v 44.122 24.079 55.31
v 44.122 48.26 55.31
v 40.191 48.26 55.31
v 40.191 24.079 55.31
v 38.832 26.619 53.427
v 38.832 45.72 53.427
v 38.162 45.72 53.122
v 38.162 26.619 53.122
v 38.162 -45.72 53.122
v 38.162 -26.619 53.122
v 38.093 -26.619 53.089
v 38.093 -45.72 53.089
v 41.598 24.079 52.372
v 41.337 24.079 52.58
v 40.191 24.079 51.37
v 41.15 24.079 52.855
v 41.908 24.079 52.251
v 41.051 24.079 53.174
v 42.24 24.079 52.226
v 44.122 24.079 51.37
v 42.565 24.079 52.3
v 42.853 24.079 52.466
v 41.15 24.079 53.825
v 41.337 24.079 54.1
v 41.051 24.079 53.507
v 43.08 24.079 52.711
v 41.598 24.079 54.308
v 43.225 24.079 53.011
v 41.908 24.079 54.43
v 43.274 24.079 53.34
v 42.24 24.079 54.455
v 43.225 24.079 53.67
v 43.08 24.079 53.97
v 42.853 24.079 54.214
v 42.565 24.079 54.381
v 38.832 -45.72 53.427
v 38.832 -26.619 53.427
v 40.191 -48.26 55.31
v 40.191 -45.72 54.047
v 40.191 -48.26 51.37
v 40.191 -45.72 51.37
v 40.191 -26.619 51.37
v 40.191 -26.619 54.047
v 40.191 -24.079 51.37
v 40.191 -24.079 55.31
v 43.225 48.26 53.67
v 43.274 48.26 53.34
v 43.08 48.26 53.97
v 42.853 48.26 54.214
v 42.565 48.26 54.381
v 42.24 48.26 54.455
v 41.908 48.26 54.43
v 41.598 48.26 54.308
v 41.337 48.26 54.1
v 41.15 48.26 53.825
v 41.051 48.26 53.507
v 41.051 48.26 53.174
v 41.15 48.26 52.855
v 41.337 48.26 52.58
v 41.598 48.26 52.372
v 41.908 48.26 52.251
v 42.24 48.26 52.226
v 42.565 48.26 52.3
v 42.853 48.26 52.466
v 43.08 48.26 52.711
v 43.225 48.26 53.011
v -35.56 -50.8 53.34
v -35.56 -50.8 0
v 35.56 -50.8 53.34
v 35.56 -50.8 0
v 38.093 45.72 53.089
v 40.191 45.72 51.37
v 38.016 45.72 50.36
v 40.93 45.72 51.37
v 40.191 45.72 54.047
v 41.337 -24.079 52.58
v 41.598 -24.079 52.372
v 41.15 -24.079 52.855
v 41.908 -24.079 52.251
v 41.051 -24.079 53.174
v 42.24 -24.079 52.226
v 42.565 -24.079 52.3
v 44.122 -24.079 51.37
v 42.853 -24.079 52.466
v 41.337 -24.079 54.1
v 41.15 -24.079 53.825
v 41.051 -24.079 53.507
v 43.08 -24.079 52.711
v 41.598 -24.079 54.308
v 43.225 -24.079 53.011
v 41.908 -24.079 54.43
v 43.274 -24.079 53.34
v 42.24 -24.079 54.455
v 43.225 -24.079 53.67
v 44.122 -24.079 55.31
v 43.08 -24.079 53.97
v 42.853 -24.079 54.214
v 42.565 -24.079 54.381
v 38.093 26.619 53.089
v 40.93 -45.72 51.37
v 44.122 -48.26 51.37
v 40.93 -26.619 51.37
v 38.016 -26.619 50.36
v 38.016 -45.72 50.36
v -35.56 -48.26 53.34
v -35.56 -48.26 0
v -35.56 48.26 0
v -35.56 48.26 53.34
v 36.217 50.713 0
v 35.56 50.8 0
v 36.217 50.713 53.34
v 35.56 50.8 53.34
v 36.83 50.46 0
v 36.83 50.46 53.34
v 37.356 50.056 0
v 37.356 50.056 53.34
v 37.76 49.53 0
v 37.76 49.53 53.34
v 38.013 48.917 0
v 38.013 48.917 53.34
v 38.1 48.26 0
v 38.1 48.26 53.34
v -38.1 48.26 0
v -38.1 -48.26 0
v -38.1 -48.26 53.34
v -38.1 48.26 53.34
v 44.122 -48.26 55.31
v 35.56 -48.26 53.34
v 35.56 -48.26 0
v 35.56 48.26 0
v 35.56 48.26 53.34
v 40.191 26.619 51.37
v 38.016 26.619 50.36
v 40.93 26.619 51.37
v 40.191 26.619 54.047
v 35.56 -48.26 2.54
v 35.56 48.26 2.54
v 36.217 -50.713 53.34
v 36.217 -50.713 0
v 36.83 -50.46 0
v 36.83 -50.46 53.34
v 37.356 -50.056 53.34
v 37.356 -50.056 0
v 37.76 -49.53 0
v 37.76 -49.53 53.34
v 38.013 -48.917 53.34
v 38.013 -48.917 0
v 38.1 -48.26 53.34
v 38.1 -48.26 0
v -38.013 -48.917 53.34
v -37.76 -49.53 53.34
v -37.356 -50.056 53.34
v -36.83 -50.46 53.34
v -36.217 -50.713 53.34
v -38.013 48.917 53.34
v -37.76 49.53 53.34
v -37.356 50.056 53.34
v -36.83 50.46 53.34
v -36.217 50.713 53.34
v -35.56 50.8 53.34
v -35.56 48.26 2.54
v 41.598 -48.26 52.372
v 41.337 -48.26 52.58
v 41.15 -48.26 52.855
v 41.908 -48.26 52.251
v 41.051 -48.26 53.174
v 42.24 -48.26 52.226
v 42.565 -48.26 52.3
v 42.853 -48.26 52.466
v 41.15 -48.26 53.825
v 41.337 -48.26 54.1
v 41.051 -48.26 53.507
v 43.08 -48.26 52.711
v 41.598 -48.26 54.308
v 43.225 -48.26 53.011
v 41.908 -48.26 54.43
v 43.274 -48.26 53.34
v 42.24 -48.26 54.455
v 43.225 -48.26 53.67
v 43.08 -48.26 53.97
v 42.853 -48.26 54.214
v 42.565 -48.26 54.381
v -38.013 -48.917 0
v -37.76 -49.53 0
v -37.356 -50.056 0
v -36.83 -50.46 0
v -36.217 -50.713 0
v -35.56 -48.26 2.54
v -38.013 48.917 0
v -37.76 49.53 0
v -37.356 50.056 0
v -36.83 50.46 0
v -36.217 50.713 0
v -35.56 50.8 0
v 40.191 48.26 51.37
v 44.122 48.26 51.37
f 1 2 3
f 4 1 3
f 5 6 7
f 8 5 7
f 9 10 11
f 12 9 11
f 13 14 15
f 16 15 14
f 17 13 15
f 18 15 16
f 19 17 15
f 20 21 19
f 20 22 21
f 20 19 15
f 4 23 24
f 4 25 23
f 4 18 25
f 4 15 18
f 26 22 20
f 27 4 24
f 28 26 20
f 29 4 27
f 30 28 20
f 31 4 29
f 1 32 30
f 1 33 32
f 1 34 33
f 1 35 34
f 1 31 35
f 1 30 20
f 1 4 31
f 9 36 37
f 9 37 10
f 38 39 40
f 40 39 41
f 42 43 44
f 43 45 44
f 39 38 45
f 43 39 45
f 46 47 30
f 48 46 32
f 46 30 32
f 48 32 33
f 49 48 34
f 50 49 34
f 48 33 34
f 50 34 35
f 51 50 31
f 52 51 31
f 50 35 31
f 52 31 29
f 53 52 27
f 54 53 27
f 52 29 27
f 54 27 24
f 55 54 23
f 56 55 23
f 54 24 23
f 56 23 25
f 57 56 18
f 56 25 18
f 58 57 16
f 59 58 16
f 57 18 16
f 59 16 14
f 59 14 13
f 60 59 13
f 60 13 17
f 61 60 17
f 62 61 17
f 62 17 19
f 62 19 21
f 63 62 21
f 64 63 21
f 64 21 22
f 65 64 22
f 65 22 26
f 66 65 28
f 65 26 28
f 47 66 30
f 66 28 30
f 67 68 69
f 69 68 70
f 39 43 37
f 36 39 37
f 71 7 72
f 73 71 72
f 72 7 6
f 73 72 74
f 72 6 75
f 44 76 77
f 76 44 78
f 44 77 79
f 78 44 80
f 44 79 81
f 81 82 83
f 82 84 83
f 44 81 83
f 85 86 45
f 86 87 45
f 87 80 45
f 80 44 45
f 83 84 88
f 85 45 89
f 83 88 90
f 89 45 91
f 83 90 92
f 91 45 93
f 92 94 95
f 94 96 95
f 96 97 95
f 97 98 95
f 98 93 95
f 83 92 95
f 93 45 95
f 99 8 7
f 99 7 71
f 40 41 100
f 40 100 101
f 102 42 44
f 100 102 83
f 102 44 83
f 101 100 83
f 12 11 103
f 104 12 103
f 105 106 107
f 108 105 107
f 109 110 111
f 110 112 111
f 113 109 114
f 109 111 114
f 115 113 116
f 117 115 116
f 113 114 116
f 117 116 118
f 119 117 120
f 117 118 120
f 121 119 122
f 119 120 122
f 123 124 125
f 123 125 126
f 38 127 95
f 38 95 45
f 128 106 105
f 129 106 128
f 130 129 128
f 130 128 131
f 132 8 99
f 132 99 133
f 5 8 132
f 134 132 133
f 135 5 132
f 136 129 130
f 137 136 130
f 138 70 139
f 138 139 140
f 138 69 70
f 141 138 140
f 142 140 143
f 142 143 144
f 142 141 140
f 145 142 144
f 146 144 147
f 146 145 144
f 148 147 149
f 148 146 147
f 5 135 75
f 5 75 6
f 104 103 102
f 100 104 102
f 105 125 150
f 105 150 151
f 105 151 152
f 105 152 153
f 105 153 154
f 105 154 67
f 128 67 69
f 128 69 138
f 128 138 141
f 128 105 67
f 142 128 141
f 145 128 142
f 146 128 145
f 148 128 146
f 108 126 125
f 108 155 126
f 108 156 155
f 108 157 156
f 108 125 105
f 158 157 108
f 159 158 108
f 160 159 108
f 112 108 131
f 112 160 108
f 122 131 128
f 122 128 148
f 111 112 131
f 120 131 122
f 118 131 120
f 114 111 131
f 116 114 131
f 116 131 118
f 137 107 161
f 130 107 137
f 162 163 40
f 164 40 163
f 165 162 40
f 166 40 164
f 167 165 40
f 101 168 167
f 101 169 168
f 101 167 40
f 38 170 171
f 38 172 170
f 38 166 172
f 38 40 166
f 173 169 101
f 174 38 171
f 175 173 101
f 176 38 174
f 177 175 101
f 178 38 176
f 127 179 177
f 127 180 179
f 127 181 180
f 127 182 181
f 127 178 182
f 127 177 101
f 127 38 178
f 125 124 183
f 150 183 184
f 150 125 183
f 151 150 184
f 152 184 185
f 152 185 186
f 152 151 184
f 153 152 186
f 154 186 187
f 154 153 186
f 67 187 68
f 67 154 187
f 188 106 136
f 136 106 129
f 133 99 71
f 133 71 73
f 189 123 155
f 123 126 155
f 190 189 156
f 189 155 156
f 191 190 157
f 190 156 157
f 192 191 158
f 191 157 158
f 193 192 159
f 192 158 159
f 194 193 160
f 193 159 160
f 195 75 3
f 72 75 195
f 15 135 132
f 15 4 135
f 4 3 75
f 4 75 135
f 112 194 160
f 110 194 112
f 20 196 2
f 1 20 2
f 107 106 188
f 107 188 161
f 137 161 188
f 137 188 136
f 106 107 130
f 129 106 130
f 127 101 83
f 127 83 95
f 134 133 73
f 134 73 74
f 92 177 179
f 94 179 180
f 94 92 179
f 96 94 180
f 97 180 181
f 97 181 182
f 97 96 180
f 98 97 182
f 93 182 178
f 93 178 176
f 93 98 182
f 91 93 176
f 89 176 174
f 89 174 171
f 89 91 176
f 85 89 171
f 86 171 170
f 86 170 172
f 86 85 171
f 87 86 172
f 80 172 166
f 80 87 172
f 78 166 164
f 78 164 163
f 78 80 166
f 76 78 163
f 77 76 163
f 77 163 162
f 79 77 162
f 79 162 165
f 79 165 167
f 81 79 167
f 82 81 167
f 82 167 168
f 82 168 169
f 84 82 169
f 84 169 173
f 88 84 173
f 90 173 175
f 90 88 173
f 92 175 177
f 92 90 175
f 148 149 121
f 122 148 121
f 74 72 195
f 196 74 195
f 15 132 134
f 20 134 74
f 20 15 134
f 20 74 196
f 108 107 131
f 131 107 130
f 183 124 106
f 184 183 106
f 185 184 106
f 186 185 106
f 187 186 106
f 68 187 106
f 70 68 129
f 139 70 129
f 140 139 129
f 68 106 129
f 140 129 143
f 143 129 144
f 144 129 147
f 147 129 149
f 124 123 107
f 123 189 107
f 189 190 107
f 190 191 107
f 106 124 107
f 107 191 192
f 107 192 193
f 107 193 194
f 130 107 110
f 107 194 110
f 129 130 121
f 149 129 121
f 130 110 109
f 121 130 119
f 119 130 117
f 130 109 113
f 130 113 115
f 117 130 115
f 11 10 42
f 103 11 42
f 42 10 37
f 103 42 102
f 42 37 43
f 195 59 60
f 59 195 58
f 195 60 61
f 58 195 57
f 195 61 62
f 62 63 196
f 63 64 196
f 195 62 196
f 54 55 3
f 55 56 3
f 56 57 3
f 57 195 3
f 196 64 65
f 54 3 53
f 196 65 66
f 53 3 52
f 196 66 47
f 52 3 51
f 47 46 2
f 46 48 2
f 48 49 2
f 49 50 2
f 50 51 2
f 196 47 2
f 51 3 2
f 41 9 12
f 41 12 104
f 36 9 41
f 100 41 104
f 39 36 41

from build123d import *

# Parameters (mm, degrees)
F0_W     = 76.2
F0_H     = 101.6
F0_W_2   = 71.12
F0_H_2   = 96.52
F1_DEPTH = 53.34
F2_DEPTH = 2.54
F3_R     = 2.54
F5_START = 24.0792
F4_R     = 1.1176
F5_DEPTH = 24.1808
F6_START = -24.0792
F6_DEPTH = 24.1808
F7_START = 26.6192
F7_DEPTH = 19.1008
F8_START = -26.6192
F8_DEPTH = 19.1008


with BuildPart() as f1:
    # F0 (on Top) → F1 (new body)
    with BuildSketch(Plane.XY):
        Rectangle(F0_W, F0_H)
        Rectangle(F0_W_2, F0_H_2, mode=Mode.SUBTRACT)
    extrude(amount=F1_DEPTH)

    # F3
    f3_edges = [f1.edges().sort_by_distance(p)[0] for p in [
        (38.1, 50.8, 26.67),
        (38.1, -50.8, 26.67),
        (-38.1, 50.8, 26.67),
        (-38.1, -50.8, 26.67),
    ]]
    fillet(f3_edges, radius=F3_R)


with BuildPart() as f2:
    # F0 (on Top) → F2 (new body)
    with BuildSketch(Plane.XY):
        Rectangle(F0_W_2, F0_H_2)
    extrude(amount=F2_DEPTH)


with BuildPart() as f5:
    # F4 (on Front) → F5 (new body)
    with BuildSketch(Plane.XZ.offset(F5_START)):
        with BuildLine():
            ThreePointArc((43.6170585206, 53.3402232693), (43.1892879745, 54.3729527232), (42.1565585206, 54.8007232693))
            ThreePointArc((42.1565585206, 54.8007232693), (41.813540729, 54.7598707764), (41.4897124367, 54.6395987156))
            ThreePointArc((41.4897124367, 54.6395987156), (40.7051061088, 53.5025382299), (41.2191582331, 52.2202496307))
            ThreePointArc((41.2191582331, 52.2202496307), (41.8726372288, 51.9075862077), (42.5959689009, 51.9473920635))
            ThreePointArc((42.5959689009, 51.9473920635), (43.3344420272, 52.4767125891), (43.6170585206, 53.3402232693))
        make_face()
        with Locations((42.1565585206, 53.3402232693)):
            Circle(F4_R, mode=Mode.SUBTRACT)
        with BuildLine():
            Line((44.122479856, 55.3104255827), (41.1208962703, 55.3104255827))
            Line((41.1208962703, 55.3104255827), (42.1565585206, 54.8007232693))
            ThreePointArc((42.1565585206, 54.8007232693), (43.1892879745, 54.3729527232), (43.6170585206, 53.3402232693))
            ThreePointArc((43.6170585206, 53.3402232693), (43.3344420272, 52.4767125891), (42.5959689009, 51.9473920635))
            Line((42.5959689009, 51.9473920635), (40.9301563026, 51.3700209558))
            Line((40.9301563026, 51.3700209558), (44.122479856, 51.3700209558))
            Line((44.122479856, 51.3700209558), (44.122479856, 55.3104255827))
        make_face()
        with BuildLine():
            Line((40.1906371851, 54.047077149), (40.1906371851, 52.7403943495))
            Line((40.1906371851, 52.7403943495), (41.2191582331, 52.2202496307))
            ThreePointArc((41.2191582331, 52.2202496307), (40.7051061088, 53.5025382299), (41.4897124367, 54.6395987156))
            Line((41.4897124367, 54.6395987156), (40.1906371851, 54.047077149))
        make_face()
        with BuildLine():
            Line((41.2191582331, 52.2202496307), (40.1906371851, 52.7403943495))
            Line((40.1906371851, 52.7403943495), (40.1906371851, 51.3700209558))
            Line((40.1906371851, 51.3700209558), (40.9301563026, 51.3700209558))
            Line((40.9301563026, 51.3700209558), (42.5959689009, 51.9473920635))
            ThreePointArc((42.5959689009, 51.9473920635), (41.8726372288, 51.9075862077), (41.2191582331, 52.2202496307))
        make_face()
        with BuildLine():
            Line((42.1565585206, 54.8007232693), (41.1208962703, 55.3104255827))
            Line((41.1208962703, 55.3104255827), (40.1906371851, 55.3104255827))
            Line((40.1906371851, 55.3104255827), (40.1906371851, 54.047077149))
            Line((40.1906371851, 54.047077149), (41.4897124367, 54.6395987156))
            ThreePointArc((41.4897124367, 54.6395987156), (41.813540729, 54.7598707764), (42.1565585206, 54.8007232693))
        make_face()
    extrude(amount=F5_DEPTH)

    # F4 (on Front) → F7 (join)
    with BuildSketch(Plane.XZ.offset(F7_START)):
        with BuildLine():
            Line((40.1906371851, 54.047077149), (40.1906371851, 52.7403943495))
            Line((40.1906371851, 52.7403943495), (41.2191582331, 52.2202496307))
            ThreePointArc((41.2191582331, 52.2202496307), (40.7051061088, 53.5025382299), (41.4897124367, 54.6395987156))
            Line((41.4897124367, 54.6395987156), (40.1906371851, 54.047077149))
        make_face()
        with BuildLine():
            Line((41.2191582331, 52.2202496307), (40.1906371851, 52.7403943495))
            Line((40.1906371851, 52.7403943495), (40.1906371851, 51.3700209558))
            Line((40.1906371851, 51.3700209558), (40.9301563026, 51.3700209558))
            Line((40.9301563026, 51.3700209558), (42.5959689009, 51.9473920635))
            ThreePointArc((42.5959689009, 51.9473920635), (41.8726372288, 51.9075862077), (41.2191582331, 52.2202496307))
        make_face()
        Polygon((38.1619204926, 53.1217586263), (38.0929333965, 53.0893978387), (38.0158303237, 50.3599147648), (40.9301563026, 51.3700209558), (40.1906371851, 51.3700209558), (40.1906371851, 52.7403943495), (38.8321008147, 53.4274347554), align=None)
        Polygon((40.1906371851, 54.047077149), (38.8321008147, 53.4274347554), (40.1906371851, 52.7403943495), align=None)
    extrude(amount=F7_DEPTH)


with BuildPart() as f6:
    # F4 (on Front) → F6 (new body)
    with BuildSketch(Plane.XZ.offset(F6_START)):
        with BuildLine():
            ThreePointArc((43.6170585206, 53.3402232693), (43.1892879745, 54.3729527232), (42.1565585206, 54.8007232693))
            ThreePointArc((42.1565585206, 54.8007232693), (41.813540729, 54.7598707764), (41.4897124367, 54.6395987156))
            ThreePointArc((41.4897124367, 54.6395987156), (40.7051061088, 53.5025382299), (41.2191582331, 52.2202496307))
            ThreePointArc((41.2191582331, 52.2202496307), (41.8726372288, 51.9075862077), (42.5959689009, 51.9473920635))
            ThreePointArc((42.5959689009, 51.9473920635), (43.3344420272, 52.4767125891), (43.6170585206, 53.3402232693))
        make_face()
        with Locations((42.1565585206, 53.3402232693)):
            Circle(F4_R, mode=Mode.SUBTRACT)
        with BuildLine():
            Line((44.122479856, 55.3104255827), (41.1208962703, 55.3104255827))
            Line((41.1208962703, 55.3104255827), (42.1565585206, 54.8007232693))
            ThreePointArc((42.1565585206, 54.8007232693), (43.1892879745, 54.3729527232), (43.6170585206, 53.3402232693))
            ThreePointArc((43.6170585206, 53.3402232693), (43.3344420272, 52.4767125891), (42.5959689009, 51.9473920635))
            Line((42.5959689009, 51.9473920635), (40.9301563026, 51.3700209558))
            Line((40.9301563026, 51.3700209558), (44.122479856, 51.3700209558))
            Line((44.122479856, 51.3700209558), (44.122479856, 55.3104255827))
        make_face()
        with BuildLine():
            Line((42.1565585206, 54.8007232693), (41.1208962703, 55.3104255827))
            Line((41.1208962703, 55.3104255827), (40.1906371851, 55.3104255827))
            Line((40.1906371851, 55.3104255827), (40.1906371851, 54.047077149))
            Line((40.1906371851, 54.047077149), (41.4897124367, 54.6395987156))
            ThreePointArc((41.4897124367, 54.6395987156), (41.813540729, 54.7598707764), (42.1565585206, 54.8007232693))
        make_face()
        with BuildLine():
            Line((40.1906371851, 54.047077149), (40.1906371851, 52.7403943495))
            Line((40.1906371851, 52.7403943495), (41.2191582331, 52.2202496307))
            ThreePointArc((41.2191582331, 52.2202496307), (40.7051061088, 53.5025382299), (41.4897124367, 54.6395987156))
            Line((41.4897124367, 54.6395987156), (40.1906371851, 54.047077149))
        make_face()
        with BuildLine():
            Line((41.2191582331, 52.2202496307), (40.1906371851, 52.7403943495))
            Line((40.1906371851, 52.7403943495), (40.1906371851, 51.3700209558))
            Line((40.1906371851, 51.3700209558), (40.9301563026, 51.3700209558))
            Line((40.9301563026, 51.3700209558), (42.5959689009, 51.9473920635))
            ThreePointArc((42.5959689009, 51.9473920635), (41.8726372288, 51.9075862077), (41.2191582331, 52.2202496307))
        make_face()
    extrude(amount=-F6_DEPTH)

    # F4 (on Front) → F8 (join)
    with BuildSketch(Plane.XZ.offset(F8_START)):
        with BuildLine():
            Line((41.2191582331, 52.2202496307), (40.1906371851, 52.7403943495))
            Line((40.1906371851, 52.7403943495), (40.1906371851, 51.3700209558))
            Line((40.1906371851, 51.3700209558), (40.9301563026, 51.3700209558))
            Line((40.9301563026, 51.3700209558), (42.5959689009, 51.9473920635))
            ThreePointArc((42.5959689009, 51.9473920635), (41.8726372288, 51.9075862077), (41.2191582331, 52.2202496307))
        make_face()
        Polygon((38.1619204926, 53.1217586263), (38.0929333965, 53.0893978387), (38.0158303237, 50.3599147648), (40.9301563026, 51.3700209558), (40.1906371851, 51.3700209558), (40.1906371851, 52.7403943495), (38.8321008147, 53.4274347554), align=None)
        Polygon((40.1906371851, 54.047077149), (38.8321008147, 53.4274347554), (40.1906371851, 52.7403943495), align=None)
        with BuildLine():
            Line((40.1906371851, 54.047077149), (40.1906371851, 52.7403943495))
            Line((40.1906371851, 52.7403943495), (41.2191582331, 52.2202496307))
            ThreePointArc((41.2191582331, 52.2202496307), (40.7051061088, 53.5025382299), (41.4897124367, 54.6395987156))
            Line((41.4897124367, 54.6395987156), (40.1906371851, 54.047077149))
        make_face()
    extrude(amount=-F8_DEPTH)


solid = Compound([f1.part, f2.part, f5.part, f6.part])
